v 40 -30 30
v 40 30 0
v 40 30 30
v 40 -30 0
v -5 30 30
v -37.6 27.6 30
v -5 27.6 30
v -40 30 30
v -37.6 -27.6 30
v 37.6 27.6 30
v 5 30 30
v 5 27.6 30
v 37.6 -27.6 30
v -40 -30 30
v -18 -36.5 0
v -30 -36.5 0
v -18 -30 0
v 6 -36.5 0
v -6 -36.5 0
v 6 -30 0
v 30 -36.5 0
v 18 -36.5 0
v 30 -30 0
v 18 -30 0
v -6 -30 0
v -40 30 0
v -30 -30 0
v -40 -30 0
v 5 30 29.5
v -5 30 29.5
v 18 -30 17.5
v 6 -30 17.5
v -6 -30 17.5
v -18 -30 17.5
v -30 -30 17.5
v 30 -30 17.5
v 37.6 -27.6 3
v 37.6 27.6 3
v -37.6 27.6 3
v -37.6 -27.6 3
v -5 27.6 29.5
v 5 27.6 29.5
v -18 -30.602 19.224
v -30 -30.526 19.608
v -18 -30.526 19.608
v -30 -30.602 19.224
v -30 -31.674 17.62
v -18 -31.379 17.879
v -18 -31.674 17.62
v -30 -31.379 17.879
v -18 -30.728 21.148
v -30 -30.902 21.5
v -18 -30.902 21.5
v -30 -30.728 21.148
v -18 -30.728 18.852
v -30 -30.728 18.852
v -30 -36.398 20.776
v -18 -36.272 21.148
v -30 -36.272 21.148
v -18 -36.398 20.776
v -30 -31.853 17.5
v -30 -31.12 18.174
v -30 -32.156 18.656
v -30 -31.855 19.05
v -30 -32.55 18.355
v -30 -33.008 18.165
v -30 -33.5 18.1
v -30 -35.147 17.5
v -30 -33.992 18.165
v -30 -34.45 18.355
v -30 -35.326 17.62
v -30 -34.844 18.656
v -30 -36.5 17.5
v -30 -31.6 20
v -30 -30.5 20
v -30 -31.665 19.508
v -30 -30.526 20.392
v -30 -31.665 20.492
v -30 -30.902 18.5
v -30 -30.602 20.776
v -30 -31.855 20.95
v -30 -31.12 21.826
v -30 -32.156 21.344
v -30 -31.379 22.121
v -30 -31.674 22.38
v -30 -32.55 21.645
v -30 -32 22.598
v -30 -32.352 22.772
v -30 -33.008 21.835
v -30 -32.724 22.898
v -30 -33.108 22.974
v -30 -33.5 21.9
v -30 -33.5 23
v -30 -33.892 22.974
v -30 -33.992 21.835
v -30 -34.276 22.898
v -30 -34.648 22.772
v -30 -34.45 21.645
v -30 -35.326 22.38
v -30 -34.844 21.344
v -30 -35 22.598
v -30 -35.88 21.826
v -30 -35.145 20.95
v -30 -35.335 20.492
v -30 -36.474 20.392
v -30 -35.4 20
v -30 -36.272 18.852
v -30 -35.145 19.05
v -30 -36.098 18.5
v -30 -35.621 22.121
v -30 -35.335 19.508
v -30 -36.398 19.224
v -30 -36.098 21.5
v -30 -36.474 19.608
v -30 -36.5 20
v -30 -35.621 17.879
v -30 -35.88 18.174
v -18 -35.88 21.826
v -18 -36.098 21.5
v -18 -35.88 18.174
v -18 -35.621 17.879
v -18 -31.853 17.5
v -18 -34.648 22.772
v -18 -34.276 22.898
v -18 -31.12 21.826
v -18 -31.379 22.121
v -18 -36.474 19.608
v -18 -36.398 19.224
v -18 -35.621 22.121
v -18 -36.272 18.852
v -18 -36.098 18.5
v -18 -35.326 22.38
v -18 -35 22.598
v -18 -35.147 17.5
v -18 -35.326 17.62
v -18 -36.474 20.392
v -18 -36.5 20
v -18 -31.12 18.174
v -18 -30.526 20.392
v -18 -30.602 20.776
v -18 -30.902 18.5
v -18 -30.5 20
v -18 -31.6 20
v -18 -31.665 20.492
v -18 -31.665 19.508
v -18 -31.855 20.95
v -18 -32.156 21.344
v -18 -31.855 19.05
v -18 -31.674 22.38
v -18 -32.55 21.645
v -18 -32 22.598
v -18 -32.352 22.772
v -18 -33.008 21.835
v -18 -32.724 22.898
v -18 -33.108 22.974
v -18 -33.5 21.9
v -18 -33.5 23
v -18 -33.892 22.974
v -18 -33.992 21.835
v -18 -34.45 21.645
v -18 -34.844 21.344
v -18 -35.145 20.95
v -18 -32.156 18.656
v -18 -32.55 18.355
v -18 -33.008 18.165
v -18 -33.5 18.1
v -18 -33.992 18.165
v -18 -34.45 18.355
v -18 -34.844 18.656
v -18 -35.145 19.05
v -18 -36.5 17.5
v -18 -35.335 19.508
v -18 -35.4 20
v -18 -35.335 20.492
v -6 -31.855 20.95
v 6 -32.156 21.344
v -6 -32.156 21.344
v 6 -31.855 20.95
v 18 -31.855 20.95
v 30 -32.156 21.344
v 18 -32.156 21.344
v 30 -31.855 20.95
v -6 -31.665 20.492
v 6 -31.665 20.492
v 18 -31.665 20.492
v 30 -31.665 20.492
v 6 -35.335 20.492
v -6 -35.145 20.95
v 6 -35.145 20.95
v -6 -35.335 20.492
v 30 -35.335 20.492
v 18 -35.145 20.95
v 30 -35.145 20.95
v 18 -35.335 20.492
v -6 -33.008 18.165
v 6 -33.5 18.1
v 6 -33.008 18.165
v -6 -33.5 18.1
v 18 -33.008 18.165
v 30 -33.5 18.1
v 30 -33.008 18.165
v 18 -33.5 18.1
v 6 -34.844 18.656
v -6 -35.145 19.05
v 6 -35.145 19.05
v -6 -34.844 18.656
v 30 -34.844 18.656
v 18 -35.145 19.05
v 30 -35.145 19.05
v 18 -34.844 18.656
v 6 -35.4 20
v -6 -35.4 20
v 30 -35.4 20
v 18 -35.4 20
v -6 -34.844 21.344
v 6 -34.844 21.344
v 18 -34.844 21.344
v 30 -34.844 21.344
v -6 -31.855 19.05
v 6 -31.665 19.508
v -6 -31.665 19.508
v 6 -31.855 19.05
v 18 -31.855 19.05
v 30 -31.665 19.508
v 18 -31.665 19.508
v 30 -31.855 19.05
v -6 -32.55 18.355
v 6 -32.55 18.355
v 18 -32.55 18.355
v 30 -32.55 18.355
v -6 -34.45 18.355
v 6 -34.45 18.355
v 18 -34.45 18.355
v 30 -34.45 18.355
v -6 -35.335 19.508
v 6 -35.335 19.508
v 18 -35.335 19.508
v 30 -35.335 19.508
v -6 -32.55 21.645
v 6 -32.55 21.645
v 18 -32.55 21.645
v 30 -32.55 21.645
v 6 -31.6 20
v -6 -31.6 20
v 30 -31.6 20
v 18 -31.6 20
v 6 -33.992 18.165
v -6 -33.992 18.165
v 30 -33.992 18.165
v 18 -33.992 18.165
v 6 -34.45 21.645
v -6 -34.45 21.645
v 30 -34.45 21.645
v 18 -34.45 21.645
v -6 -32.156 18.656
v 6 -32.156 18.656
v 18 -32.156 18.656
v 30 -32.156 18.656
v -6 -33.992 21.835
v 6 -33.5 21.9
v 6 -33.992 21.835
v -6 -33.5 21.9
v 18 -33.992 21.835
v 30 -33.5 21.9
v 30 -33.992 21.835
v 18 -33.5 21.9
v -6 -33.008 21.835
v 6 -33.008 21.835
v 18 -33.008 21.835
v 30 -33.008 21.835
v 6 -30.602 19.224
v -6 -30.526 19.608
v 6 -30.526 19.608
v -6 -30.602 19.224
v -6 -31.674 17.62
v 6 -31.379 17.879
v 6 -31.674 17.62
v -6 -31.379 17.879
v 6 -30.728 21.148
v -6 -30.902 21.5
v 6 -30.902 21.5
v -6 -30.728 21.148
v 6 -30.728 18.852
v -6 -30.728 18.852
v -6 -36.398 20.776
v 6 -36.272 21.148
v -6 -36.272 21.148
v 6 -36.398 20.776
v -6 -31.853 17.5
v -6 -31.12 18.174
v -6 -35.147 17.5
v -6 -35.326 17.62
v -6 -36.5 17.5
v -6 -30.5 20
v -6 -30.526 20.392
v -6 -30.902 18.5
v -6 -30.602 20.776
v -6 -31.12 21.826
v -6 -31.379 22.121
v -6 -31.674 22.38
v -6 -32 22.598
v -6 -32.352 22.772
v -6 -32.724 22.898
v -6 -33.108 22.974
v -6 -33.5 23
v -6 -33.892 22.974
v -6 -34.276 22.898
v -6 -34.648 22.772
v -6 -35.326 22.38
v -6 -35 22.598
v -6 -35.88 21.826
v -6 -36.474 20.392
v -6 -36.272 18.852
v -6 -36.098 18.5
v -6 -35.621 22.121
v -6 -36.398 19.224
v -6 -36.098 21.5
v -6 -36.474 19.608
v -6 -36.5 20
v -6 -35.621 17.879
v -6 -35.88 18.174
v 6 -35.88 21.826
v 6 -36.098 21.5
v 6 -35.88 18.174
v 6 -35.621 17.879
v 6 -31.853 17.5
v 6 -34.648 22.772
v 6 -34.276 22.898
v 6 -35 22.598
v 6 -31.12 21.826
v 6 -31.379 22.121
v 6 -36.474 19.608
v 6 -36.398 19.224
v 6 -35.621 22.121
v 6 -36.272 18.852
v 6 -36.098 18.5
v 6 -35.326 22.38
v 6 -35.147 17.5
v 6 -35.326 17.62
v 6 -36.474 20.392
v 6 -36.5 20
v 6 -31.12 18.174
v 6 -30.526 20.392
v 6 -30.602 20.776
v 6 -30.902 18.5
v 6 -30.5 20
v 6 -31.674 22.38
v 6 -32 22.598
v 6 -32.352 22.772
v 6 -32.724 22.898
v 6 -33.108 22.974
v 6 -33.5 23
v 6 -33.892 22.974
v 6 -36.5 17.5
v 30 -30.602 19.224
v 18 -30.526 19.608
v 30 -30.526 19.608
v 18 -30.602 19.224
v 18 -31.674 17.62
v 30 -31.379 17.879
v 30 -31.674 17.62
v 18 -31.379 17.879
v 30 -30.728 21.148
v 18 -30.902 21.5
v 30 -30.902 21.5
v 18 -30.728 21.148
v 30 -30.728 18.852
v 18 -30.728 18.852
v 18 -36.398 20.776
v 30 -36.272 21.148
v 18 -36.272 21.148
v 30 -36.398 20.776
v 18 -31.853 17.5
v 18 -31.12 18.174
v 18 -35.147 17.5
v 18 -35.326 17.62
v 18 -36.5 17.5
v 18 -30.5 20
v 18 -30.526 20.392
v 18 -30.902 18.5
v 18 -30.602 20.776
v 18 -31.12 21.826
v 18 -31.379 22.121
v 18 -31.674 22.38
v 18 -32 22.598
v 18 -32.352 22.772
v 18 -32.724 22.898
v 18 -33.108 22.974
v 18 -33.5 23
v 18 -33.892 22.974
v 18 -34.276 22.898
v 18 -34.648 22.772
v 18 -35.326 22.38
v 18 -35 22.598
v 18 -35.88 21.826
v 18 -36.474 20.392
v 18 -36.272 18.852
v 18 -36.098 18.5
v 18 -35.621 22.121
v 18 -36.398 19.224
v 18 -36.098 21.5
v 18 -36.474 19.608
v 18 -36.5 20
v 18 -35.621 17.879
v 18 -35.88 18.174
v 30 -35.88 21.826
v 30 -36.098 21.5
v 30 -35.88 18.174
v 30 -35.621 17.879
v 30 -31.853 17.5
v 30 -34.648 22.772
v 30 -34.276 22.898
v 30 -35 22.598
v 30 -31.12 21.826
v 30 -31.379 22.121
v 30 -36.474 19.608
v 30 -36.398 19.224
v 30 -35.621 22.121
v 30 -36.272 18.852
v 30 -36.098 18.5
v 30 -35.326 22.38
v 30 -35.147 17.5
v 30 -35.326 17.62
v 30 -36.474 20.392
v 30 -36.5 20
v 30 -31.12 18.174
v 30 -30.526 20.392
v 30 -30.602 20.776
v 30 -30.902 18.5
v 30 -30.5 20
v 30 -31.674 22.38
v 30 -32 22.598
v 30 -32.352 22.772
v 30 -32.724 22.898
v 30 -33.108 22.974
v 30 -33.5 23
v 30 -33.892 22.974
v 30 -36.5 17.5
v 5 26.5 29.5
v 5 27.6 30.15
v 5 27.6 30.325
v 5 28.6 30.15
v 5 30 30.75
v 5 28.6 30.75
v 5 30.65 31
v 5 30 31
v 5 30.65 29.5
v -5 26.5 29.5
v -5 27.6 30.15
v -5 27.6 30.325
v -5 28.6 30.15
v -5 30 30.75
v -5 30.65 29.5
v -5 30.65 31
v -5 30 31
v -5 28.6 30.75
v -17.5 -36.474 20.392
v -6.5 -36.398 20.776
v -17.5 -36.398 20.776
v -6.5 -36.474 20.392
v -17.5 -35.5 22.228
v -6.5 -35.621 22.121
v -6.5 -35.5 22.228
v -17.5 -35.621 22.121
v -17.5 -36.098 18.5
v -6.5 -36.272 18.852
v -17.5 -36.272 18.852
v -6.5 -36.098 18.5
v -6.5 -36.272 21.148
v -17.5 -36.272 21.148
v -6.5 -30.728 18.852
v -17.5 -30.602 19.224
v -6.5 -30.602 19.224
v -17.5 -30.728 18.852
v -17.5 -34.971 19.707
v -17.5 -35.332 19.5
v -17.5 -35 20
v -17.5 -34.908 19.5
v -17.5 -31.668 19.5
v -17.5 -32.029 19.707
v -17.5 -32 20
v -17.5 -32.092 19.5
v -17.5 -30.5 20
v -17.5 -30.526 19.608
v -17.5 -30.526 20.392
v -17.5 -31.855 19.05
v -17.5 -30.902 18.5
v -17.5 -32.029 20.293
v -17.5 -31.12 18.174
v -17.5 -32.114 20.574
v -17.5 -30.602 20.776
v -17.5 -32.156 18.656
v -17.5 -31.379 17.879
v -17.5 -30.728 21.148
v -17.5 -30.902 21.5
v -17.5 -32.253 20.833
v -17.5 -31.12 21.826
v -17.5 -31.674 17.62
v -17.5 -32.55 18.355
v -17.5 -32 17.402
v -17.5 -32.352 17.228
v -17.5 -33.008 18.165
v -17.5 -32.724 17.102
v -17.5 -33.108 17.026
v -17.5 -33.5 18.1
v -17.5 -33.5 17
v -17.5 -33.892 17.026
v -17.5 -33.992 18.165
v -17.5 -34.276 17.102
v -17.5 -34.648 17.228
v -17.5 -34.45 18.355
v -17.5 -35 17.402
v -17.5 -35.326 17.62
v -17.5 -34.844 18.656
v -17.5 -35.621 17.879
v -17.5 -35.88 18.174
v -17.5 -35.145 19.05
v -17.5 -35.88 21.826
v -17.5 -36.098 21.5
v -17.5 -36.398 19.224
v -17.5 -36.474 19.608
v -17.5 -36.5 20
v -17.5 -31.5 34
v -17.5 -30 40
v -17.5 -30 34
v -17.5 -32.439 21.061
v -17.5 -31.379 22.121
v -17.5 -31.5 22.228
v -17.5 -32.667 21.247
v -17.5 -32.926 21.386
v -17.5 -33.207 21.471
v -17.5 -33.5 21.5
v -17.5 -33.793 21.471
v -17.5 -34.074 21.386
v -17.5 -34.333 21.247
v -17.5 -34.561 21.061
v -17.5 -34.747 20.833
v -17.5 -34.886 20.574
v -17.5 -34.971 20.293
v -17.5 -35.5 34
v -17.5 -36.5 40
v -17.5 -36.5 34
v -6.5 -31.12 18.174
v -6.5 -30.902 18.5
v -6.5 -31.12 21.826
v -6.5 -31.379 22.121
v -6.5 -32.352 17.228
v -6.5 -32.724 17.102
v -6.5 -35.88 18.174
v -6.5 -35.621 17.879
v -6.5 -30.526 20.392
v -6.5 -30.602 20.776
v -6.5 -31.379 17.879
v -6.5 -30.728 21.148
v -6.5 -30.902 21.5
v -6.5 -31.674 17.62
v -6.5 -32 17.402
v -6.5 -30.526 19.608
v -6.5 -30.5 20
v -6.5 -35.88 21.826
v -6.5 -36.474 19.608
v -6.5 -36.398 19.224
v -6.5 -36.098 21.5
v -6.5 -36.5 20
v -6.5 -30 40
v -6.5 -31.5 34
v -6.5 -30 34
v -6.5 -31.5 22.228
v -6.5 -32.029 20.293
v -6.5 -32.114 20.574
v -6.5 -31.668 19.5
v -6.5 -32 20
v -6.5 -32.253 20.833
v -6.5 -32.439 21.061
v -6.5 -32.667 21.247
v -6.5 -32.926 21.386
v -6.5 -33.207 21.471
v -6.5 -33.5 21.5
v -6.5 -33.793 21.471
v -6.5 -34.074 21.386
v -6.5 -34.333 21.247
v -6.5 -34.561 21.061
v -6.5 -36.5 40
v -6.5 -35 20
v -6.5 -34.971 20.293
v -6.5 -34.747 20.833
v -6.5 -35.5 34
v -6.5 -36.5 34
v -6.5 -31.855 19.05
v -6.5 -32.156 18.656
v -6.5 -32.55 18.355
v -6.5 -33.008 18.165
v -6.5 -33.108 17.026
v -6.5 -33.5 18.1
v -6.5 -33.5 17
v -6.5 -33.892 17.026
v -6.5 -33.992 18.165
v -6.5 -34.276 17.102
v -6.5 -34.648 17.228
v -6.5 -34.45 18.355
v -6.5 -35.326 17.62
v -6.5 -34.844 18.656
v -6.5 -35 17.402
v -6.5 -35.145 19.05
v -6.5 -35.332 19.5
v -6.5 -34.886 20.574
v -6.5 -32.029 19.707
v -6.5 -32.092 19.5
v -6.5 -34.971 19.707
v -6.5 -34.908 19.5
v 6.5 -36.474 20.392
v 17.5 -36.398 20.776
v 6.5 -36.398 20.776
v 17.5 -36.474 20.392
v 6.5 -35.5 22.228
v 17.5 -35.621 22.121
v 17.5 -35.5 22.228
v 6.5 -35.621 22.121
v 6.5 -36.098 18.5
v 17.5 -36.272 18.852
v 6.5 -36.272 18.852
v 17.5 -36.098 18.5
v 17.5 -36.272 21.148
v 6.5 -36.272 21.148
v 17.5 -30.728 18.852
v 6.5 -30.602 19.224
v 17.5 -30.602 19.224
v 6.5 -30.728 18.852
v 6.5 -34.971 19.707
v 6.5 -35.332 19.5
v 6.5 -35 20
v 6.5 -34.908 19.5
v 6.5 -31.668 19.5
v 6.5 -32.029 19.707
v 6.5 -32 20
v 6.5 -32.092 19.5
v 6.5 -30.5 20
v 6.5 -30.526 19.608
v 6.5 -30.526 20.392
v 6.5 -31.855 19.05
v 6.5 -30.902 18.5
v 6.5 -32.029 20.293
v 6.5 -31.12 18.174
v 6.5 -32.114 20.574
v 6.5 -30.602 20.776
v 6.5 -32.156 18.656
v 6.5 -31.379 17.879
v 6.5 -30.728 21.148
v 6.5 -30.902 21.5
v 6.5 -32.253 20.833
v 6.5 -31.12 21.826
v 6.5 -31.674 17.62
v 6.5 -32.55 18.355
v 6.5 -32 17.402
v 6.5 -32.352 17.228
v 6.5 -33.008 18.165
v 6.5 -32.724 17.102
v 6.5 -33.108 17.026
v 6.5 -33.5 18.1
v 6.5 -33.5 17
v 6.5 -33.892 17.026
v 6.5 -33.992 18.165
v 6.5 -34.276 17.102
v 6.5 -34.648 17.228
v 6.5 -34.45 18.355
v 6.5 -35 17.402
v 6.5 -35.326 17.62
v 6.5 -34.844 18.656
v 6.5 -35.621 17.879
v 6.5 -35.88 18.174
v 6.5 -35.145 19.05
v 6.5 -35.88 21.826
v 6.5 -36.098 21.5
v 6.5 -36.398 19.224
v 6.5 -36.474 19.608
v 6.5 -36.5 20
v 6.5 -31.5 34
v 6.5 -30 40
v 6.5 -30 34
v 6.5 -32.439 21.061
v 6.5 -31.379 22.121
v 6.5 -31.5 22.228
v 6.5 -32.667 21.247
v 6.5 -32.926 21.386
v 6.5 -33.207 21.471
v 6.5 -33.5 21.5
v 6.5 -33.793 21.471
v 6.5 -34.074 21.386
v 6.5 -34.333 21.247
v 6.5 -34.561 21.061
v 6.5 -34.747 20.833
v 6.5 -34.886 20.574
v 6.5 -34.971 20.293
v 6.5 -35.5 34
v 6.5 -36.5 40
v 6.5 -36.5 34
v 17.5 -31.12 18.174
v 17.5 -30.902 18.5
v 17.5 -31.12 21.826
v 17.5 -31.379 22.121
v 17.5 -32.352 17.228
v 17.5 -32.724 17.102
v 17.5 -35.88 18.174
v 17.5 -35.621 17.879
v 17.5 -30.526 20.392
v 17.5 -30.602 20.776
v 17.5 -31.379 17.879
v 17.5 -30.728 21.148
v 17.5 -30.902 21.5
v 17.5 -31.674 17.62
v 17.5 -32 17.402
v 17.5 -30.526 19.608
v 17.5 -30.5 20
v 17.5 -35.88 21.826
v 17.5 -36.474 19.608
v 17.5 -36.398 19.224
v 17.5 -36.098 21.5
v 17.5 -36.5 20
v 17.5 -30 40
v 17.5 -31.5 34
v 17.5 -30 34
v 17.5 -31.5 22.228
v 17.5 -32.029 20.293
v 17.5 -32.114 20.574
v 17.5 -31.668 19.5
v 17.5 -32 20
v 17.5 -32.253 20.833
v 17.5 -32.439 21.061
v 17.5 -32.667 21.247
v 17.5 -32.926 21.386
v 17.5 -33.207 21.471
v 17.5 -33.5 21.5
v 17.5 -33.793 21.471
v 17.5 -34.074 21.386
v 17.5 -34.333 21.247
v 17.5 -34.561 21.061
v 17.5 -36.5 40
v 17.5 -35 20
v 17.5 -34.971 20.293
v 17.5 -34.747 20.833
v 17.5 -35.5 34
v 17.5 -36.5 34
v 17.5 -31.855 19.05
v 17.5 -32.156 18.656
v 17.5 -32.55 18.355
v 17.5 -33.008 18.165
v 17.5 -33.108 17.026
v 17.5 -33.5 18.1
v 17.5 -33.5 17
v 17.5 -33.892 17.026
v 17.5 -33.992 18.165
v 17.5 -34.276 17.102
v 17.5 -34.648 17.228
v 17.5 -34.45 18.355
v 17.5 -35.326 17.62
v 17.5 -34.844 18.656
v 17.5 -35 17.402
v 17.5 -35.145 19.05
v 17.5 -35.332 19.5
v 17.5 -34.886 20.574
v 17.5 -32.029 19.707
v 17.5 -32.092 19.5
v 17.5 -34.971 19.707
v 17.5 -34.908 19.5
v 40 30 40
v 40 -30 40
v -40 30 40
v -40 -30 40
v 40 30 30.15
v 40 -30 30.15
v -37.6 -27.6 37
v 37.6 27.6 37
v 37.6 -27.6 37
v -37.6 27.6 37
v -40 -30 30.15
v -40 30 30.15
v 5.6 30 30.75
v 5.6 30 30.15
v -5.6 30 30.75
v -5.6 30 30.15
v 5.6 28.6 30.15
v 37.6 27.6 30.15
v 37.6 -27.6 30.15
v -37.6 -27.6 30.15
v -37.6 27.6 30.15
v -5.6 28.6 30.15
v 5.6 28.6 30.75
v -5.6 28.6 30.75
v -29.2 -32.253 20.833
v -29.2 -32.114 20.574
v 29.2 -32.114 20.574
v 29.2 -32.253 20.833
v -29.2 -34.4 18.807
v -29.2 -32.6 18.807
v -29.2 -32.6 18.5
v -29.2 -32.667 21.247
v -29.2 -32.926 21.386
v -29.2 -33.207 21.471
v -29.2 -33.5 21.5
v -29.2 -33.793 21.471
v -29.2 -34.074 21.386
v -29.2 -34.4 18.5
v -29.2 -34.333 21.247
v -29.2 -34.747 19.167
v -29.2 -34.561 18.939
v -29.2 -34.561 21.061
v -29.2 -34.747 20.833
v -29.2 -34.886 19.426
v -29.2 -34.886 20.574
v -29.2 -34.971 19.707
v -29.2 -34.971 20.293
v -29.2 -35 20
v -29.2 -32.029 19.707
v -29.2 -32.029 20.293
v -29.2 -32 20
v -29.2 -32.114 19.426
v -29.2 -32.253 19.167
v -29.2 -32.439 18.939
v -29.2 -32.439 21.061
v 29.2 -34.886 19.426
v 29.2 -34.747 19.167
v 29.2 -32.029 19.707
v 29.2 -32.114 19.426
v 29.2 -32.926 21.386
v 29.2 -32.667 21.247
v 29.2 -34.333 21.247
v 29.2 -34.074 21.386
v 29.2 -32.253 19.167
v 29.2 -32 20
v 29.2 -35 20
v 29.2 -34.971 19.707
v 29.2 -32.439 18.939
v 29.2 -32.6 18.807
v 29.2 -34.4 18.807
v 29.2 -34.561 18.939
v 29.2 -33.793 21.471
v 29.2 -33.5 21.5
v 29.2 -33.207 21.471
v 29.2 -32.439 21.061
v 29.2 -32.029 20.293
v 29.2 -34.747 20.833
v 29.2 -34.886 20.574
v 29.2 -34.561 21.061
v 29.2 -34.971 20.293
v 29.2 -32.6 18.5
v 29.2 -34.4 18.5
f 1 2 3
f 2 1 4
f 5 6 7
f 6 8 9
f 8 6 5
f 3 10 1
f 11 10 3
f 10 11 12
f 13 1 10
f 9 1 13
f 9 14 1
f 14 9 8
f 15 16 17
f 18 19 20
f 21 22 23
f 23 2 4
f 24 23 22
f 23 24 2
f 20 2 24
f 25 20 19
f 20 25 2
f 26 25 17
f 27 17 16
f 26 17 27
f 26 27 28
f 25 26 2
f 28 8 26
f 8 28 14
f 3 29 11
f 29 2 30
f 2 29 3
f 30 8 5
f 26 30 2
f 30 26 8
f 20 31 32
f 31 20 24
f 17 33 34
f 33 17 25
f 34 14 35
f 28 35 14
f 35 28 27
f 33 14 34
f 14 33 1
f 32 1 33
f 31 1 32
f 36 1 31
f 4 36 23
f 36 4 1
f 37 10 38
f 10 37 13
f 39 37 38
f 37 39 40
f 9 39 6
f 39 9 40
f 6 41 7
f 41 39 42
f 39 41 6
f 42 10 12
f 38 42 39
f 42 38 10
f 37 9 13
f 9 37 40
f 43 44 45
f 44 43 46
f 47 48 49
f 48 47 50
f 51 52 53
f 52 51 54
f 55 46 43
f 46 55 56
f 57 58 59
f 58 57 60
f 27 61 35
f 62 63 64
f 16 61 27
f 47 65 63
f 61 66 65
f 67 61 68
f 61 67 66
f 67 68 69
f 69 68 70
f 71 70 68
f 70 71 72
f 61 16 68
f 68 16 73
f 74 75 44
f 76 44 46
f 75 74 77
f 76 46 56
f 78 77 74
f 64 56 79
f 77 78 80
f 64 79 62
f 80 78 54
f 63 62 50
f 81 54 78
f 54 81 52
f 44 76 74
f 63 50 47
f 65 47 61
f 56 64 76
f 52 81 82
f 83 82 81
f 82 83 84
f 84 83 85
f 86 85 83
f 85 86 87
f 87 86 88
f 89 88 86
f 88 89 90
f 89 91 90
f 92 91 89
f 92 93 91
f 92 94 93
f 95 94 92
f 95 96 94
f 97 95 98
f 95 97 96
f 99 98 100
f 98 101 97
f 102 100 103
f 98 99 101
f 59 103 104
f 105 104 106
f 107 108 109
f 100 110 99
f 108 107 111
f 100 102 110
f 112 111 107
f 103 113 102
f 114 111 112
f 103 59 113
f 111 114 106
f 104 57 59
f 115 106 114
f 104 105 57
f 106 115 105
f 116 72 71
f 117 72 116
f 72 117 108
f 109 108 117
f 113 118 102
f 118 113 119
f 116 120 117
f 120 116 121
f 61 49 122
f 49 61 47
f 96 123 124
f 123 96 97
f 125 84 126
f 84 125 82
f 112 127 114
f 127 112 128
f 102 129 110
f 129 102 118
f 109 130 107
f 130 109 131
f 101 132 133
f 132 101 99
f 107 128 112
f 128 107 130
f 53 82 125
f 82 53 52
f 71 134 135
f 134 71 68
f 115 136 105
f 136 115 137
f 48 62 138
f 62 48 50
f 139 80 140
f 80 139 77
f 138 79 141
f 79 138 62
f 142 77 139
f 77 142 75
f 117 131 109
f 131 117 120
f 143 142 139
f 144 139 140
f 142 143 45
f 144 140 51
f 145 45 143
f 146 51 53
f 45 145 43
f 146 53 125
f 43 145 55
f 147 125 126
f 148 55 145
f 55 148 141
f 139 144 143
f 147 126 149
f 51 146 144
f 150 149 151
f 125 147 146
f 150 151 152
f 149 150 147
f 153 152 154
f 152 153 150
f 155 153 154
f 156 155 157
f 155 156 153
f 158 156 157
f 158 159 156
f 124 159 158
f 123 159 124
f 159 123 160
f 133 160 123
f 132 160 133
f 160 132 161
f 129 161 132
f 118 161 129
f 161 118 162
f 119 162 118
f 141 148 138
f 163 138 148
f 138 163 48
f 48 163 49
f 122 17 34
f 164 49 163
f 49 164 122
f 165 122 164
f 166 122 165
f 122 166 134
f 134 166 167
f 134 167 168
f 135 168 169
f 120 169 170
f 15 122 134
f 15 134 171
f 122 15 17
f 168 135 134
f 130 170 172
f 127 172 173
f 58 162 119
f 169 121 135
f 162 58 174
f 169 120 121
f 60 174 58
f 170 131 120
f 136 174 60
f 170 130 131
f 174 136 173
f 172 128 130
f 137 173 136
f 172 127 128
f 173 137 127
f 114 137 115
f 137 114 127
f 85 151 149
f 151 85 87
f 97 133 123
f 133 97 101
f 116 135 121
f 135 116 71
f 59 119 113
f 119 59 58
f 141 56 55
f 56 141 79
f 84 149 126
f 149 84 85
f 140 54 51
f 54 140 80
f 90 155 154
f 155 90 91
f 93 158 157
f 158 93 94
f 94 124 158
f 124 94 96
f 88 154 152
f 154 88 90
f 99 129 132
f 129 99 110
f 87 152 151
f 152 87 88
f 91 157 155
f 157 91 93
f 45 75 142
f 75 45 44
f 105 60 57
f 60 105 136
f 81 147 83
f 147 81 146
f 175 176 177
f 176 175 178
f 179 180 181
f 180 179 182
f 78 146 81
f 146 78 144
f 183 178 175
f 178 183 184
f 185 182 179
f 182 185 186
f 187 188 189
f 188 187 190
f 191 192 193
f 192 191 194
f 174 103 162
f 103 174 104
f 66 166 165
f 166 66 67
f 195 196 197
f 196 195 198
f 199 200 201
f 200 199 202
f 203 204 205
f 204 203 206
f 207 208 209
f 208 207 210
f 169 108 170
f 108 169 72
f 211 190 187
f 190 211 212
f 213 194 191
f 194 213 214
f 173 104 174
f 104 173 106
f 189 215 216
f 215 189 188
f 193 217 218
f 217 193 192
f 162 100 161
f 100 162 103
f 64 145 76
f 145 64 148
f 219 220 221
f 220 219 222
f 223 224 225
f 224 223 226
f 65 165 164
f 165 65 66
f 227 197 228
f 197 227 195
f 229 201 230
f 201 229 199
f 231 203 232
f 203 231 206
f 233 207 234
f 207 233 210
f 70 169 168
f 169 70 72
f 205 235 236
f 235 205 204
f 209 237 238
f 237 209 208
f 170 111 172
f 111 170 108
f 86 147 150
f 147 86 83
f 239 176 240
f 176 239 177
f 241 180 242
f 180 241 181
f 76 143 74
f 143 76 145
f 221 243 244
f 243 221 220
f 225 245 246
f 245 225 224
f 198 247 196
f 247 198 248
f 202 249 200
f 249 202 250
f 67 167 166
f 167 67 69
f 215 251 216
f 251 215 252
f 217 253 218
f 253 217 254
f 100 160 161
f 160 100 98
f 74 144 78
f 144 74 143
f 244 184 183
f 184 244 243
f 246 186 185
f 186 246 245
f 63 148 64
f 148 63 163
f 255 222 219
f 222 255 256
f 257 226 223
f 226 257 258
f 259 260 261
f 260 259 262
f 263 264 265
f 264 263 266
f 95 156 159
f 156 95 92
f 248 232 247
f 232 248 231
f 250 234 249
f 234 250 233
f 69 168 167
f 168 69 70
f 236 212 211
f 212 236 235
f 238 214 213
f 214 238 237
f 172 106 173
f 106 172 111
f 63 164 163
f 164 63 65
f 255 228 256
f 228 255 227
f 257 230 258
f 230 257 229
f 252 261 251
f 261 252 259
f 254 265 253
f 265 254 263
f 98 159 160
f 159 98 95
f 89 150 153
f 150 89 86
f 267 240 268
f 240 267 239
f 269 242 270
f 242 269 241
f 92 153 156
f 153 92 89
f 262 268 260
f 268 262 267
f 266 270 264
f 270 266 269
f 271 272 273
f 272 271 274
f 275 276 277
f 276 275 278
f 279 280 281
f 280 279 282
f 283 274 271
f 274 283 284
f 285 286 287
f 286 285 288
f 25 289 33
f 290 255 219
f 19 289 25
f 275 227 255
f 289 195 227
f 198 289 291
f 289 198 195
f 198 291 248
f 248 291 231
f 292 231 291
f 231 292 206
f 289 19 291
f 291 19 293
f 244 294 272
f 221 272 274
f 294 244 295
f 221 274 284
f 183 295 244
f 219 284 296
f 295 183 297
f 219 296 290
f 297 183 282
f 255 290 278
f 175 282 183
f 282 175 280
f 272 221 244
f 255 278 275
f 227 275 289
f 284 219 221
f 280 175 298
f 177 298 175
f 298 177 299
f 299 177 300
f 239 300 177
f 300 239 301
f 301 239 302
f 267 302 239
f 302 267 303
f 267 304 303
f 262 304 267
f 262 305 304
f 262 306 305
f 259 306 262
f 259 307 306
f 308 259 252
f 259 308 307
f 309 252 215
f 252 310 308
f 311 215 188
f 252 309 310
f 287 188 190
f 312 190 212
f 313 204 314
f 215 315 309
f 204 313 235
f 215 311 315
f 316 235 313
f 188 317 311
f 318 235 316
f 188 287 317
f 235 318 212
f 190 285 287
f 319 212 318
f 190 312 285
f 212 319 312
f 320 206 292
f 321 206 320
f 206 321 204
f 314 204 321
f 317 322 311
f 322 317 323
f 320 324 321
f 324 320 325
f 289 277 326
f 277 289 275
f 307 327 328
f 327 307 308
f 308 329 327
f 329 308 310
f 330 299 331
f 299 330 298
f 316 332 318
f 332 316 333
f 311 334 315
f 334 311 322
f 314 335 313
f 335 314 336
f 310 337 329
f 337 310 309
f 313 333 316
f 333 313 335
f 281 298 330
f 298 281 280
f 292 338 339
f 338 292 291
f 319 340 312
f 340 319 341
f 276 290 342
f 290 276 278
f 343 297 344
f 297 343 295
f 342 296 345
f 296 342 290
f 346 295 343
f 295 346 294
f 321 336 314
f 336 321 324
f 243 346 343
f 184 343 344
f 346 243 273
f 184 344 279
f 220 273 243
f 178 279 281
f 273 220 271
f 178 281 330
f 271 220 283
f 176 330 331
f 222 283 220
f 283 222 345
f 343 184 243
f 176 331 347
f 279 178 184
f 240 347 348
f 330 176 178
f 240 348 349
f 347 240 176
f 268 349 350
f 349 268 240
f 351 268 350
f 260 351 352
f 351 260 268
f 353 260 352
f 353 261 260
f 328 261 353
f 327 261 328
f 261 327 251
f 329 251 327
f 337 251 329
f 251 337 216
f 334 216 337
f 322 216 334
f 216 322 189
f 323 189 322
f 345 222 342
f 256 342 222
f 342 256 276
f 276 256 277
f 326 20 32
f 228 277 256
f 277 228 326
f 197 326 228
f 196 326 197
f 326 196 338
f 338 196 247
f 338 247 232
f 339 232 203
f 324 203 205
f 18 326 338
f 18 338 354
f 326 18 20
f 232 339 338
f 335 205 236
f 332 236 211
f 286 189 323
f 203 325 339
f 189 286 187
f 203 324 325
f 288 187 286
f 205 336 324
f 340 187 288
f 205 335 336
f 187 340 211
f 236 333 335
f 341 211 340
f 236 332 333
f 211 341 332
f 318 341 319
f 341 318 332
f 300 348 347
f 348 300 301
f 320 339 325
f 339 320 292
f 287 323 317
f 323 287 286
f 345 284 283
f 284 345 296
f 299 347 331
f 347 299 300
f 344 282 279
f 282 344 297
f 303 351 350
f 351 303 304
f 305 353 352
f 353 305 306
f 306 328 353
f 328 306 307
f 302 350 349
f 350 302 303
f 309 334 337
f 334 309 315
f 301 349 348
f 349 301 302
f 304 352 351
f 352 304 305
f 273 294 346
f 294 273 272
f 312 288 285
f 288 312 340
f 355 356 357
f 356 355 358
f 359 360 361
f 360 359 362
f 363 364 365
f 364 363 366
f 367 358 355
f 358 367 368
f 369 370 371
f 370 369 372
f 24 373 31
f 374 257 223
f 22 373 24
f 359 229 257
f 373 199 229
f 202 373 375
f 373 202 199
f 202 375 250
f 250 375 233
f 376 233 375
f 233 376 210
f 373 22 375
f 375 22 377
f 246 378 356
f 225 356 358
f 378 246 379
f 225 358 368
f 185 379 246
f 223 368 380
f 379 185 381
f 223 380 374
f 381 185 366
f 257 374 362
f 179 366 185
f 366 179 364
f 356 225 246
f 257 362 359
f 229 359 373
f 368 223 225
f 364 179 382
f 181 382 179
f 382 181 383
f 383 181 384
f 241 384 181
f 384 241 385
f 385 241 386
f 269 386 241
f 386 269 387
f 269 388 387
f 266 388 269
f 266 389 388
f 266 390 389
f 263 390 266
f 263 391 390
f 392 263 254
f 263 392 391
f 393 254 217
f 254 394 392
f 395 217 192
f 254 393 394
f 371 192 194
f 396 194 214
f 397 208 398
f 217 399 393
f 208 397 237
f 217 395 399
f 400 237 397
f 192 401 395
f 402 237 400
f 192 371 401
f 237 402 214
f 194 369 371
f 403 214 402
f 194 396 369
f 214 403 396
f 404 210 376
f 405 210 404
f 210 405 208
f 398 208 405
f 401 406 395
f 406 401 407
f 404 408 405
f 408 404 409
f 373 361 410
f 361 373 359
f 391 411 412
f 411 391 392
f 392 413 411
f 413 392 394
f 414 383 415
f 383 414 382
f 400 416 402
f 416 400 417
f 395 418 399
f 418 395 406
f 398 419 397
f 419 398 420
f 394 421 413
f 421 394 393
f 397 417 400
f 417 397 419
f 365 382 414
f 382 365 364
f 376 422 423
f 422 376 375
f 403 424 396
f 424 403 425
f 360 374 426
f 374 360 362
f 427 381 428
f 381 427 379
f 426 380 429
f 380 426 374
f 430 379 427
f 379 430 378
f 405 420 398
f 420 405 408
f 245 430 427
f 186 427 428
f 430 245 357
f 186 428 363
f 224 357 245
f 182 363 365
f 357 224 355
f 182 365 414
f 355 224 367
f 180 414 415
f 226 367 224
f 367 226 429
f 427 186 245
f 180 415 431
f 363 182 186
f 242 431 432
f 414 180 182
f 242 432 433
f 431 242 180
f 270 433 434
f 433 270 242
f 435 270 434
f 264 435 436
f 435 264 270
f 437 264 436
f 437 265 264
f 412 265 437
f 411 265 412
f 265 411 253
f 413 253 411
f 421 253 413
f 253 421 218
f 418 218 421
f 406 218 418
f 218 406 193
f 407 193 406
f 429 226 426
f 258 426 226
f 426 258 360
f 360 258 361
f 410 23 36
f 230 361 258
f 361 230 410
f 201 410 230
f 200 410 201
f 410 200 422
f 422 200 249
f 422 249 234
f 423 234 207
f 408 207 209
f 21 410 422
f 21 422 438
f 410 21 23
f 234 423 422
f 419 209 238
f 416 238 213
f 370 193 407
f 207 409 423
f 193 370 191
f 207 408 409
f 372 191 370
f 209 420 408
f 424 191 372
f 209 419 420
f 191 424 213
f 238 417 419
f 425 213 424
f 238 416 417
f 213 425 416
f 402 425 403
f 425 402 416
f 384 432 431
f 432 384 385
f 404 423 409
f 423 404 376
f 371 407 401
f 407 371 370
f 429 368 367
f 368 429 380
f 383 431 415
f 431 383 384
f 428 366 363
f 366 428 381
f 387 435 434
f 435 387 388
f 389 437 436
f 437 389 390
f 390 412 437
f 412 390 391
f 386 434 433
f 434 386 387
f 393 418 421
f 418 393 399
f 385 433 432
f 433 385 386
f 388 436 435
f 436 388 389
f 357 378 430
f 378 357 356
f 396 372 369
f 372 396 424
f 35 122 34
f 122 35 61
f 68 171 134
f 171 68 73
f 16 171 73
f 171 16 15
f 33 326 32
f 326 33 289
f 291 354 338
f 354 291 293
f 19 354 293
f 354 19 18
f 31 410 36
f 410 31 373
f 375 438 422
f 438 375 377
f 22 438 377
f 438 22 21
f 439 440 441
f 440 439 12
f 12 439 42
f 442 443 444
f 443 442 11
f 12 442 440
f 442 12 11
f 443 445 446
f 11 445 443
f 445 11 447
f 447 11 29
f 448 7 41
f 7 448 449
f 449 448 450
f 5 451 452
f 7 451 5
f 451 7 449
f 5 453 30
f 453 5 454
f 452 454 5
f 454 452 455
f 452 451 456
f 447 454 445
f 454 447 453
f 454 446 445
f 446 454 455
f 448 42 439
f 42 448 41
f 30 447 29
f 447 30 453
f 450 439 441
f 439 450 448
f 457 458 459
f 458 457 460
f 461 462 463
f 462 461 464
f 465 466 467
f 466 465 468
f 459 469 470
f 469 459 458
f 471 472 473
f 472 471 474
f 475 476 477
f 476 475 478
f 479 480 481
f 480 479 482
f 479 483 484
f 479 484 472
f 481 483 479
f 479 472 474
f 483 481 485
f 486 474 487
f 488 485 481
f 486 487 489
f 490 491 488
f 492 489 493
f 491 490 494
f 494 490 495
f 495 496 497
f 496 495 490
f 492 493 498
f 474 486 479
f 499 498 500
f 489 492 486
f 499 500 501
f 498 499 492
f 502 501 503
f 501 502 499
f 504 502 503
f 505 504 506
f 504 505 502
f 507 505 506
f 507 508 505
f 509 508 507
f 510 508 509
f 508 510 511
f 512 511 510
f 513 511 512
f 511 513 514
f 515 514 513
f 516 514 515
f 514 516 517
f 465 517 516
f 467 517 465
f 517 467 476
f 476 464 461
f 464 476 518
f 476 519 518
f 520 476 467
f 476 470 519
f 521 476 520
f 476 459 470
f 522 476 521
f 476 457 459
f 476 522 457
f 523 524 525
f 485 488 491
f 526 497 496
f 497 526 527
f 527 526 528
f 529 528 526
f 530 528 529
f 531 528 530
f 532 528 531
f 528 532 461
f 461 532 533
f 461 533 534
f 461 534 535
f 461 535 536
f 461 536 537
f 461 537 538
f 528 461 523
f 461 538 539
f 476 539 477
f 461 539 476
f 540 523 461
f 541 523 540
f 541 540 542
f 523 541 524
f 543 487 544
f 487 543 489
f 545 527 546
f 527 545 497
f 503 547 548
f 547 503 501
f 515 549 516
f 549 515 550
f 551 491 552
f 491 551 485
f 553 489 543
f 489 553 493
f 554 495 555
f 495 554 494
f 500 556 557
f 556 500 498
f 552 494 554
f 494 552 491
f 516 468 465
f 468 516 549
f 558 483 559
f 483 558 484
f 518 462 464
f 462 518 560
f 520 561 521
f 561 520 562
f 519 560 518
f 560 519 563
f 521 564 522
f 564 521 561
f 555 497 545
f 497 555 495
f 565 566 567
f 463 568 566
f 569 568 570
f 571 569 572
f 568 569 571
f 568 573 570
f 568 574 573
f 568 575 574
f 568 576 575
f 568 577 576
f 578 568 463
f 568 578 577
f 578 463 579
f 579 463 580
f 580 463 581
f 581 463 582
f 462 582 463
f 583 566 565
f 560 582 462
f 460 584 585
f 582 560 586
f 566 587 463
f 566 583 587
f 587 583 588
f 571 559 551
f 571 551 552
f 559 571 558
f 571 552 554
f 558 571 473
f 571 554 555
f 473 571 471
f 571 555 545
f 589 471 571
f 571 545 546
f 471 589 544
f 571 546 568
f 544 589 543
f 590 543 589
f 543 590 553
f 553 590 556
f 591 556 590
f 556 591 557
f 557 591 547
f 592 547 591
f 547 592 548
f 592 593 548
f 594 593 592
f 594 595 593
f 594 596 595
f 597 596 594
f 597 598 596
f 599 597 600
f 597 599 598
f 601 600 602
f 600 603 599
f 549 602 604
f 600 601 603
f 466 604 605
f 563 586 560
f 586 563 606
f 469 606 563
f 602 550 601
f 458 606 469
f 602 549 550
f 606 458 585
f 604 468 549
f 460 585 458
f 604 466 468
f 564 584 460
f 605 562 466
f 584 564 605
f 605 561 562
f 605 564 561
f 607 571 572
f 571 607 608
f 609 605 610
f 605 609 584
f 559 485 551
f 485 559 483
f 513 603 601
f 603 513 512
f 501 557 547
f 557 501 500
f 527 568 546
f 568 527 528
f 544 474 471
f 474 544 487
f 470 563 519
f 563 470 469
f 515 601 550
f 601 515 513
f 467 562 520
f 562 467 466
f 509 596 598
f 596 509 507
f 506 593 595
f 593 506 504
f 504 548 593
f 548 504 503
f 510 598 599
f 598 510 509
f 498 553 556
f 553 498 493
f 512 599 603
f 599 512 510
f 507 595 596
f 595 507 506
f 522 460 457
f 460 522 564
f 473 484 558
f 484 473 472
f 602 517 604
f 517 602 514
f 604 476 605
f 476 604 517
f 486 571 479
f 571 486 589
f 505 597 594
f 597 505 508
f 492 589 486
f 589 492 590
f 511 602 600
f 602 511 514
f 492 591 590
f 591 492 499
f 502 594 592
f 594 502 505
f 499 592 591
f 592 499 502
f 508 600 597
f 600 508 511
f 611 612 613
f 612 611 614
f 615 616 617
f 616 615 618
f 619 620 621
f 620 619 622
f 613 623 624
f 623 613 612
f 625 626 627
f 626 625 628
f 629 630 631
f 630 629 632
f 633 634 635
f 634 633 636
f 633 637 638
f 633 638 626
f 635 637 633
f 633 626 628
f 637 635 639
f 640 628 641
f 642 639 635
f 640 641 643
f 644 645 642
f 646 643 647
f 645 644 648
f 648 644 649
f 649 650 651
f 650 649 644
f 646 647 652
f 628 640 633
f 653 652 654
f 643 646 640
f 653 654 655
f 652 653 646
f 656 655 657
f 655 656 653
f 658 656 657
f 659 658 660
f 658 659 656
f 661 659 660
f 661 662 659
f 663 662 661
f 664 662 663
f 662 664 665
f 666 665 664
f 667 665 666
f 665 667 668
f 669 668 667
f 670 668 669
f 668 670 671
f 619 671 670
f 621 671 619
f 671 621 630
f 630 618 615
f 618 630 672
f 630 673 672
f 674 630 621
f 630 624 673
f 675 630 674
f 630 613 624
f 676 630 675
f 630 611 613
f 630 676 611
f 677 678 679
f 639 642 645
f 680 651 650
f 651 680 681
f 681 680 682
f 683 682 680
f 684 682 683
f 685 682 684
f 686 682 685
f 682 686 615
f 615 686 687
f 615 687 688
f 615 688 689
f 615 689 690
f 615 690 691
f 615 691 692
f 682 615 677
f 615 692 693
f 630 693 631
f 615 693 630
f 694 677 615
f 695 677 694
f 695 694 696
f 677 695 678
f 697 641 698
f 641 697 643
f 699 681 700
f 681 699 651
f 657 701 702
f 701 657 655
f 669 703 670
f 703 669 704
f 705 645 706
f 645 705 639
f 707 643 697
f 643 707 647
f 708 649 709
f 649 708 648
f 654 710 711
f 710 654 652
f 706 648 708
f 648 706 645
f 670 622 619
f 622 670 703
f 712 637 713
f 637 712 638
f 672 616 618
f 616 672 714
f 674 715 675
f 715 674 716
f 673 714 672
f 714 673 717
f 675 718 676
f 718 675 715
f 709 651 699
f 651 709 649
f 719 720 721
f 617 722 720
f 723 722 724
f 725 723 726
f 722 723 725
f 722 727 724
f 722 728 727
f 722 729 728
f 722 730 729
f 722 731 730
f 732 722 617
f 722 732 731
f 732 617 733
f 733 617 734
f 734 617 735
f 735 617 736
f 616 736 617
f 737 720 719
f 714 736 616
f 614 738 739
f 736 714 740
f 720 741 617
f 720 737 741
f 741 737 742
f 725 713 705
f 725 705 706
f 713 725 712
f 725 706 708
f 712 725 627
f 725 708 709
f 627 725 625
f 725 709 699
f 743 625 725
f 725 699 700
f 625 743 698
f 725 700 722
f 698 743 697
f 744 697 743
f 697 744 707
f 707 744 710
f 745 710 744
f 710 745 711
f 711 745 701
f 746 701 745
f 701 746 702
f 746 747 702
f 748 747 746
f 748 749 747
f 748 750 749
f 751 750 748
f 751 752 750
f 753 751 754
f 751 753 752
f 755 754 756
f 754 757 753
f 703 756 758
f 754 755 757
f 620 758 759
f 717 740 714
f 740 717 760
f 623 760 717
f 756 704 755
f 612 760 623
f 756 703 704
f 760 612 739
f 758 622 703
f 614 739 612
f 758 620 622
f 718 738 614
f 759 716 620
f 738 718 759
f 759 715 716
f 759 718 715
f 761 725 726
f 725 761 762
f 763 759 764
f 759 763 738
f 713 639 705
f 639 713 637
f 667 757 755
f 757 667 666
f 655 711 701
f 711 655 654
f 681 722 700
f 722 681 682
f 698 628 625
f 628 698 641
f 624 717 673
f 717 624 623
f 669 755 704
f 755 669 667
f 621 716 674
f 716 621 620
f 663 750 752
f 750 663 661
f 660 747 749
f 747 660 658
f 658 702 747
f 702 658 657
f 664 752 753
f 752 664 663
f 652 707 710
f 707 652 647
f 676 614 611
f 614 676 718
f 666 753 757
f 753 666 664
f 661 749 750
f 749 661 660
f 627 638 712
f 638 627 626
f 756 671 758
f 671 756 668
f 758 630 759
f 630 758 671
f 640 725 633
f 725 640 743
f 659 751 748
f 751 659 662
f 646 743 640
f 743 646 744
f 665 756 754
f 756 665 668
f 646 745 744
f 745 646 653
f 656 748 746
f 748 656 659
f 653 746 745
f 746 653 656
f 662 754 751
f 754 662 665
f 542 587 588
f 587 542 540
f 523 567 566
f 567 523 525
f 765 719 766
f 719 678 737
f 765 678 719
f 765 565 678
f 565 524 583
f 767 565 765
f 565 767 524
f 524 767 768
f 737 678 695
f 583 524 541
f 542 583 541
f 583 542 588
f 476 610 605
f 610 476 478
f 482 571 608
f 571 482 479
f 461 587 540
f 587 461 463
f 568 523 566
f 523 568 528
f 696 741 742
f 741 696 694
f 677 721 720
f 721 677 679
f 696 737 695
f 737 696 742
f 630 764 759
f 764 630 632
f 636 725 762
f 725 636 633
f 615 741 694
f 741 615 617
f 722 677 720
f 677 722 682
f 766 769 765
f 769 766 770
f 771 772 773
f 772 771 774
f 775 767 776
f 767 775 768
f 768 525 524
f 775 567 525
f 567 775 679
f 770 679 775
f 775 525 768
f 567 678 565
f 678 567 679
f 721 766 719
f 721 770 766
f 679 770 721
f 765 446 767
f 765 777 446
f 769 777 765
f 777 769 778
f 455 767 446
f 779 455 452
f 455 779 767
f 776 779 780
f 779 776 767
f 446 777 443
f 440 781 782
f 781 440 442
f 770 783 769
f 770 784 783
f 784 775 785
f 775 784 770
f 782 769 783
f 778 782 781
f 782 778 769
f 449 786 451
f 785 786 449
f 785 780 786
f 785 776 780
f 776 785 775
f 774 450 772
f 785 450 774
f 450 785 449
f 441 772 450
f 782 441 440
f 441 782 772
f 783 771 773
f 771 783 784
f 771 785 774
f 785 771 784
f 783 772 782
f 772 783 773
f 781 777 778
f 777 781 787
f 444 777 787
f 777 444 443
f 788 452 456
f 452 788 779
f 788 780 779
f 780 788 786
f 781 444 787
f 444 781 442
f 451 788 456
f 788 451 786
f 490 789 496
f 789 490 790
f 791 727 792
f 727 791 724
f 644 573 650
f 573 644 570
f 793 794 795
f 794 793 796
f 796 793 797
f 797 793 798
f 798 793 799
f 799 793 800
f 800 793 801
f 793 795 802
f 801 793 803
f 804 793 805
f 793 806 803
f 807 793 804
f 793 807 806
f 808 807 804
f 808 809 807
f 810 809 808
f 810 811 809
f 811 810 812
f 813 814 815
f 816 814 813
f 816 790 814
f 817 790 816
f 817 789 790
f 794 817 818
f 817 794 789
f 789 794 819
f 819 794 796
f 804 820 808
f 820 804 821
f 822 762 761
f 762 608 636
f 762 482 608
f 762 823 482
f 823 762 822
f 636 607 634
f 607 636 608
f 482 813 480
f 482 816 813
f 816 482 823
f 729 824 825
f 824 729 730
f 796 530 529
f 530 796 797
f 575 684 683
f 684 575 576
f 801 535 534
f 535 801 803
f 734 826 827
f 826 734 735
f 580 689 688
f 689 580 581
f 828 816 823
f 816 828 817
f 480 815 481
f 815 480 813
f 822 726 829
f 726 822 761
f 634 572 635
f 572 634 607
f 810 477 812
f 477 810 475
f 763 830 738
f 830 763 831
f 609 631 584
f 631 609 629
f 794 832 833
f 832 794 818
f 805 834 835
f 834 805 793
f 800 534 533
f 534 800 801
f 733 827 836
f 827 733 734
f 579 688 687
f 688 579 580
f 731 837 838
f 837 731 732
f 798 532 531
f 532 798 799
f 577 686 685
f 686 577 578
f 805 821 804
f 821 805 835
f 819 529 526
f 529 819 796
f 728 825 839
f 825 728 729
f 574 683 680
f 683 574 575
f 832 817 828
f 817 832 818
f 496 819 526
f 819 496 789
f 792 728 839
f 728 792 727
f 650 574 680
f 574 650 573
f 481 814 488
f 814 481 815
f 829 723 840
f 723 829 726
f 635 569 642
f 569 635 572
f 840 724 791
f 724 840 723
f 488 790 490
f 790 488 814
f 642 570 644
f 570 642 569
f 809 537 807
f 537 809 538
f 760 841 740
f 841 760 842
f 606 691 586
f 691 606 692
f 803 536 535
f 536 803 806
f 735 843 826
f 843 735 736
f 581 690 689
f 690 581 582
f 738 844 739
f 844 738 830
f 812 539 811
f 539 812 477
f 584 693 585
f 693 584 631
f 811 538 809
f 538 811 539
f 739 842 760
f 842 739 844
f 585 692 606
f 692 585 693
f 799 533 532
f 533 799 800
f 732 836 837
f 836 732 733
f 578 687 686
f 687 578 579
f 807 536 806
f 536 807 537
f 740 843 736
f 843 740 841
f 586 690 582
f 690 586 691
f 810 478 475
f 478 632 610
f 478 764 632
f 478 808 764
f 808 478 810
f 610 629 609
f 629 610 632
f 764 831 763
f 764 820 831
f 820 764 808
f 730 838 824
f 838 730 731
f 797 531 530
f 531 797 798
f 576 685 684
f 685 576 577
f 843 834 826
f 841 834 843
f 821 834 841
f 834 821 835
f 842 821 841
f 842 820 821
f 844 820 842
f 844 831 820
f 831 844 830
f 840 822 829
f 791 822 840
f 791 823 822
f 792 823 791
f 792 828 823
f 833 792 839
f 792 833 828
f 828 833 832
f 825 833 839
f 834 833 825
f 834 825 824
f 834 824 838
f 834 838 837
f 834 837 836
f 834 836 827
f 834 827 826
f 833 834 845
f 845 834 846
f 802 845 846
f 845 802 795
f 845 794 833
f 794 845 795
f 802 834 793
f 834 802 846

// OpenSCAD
part = "assembly"; // [base, lid, pin, assembly]
cadverify_only = "";
module instance(name, part, unit = 1) {
  echo(cadverify_instance = [name, part, unit]);
  if (cadverify_only == "" || cadverify_only == name) children();
}
Ya = -33.5; Za = 20; Kr = 3.0; Br = 1.9; Pr = 1.5;
BX = [[-30,-18],[-6,6],[18,30]];
LX = [[-17.5,-6.5],[6.5,17.5]];
module barrelX(x0, x1) {
  difference() {
    translate([0,Ya,Za]) rotate([0,90,0]) translate([0,0,(x0+x1)/2])
      cylinder(h=x1-x0, r=Kr, center=true, $fn=48);
    translate([0,Ya,Za]) rotate([0,90,0]) translate([0,0,(x0+x1)/2])
      cylinder(h=(x1-x0)+1.0, r=Br, center=true, $fn=24);
  }
}
module base_geom() {
  difference() {
  union() {
    difference() {
      translate([-40,-30,0]) cube([80,60,30]);
      translate([-37.6,-27.6,3]) cube([75.2,55.2,27.01]);
    }
    for (b=BX) {
      translate([b[0],-36.5,0]) cube([b[1]-b[0],6.5,17.5]);
      barrelX(b[0], b[1]);
    }
    translate([5,0,0]) rotate([0,-90,0]) linear_extrude(height=10)
      polygon([[29.5,26.5],[31,28.5],[31,30.65],[29.5,30.65]]);
  }
  translate([0,Ya,Za]) rotate([0,90,0]) translate([0,0,0])
    cylinder(h=62, r=Br, center=true, $fn=24);
  }
}
module lid_open() {
  difference() {
    union() {
      translate([-40,-97,0]) cube([80,60,3]);
      translate([-40,-97,3]) cube([80,2.4,6.85]);
      translate([-40,-39.4,3]) cube([80,2.4,6.85]);
      translate([-40,-97,3]) cube([2.4,60,6.85]);
      translate([37.6,-97,3]) cube([2.4,60,6.85]);
      for (b=LX) {
        translate([b[0],-39,0]) cube([b[1]-b[0],8.5,6]);
        translate([b[0],-35.5,3]) cube([b[1]-b[0],4,17.5]);
        barrelX(b[0], b[1]);
      }
    }
    translate([-5.6,-98.6,9.25]) cube([11.2,3,0.76]);
  }
}
module pin_geom() {
  union() {
    translate([-29.2,0,1.5]) rotate([0,90,0])
      cylinder(h=58.4, r=Pr, center=false, $fn=32);
    translate([-29.2,-0.9,0]) cube([58.4,1.8,0.6]);
  }
}
module lid_closed() {
  translate([0,Ya,Za]) rotate([180,0,0]) translate([0,-Ya,-Za]) lid_open();
}
module pin_placed() {
  translate([0,Ya,Za-1.5]) pin_geom();
}
if (part=="base") {
  base_geom();
  echo(cadverify_spec=[
    ["bounds", [[-40,-36.5,0],[40,31,30.65]]],
    ["bodies", 1],
    ["support_faces", [["base","-z",4000]]],
    ["overhangs_allowed", [["hinge", [[-30,-37,16],[30,-30,24]]]]],
    ["copies", 1],
    ["details", [
      ["bottom","thickness",[0,0,-1],[0,0,1],3],
      ["cavity","void",[[-37.6,-27.6,3],[37.6,27.6,30]],0.9],
      ["knuckle","material",[[-30,-36.5,17],[-18,-30.5,23]],0.5],
      ["bore","hole",[-31,-33.5,20],[1,0,0],[[0,3.8],[10,3.8]]],
      ["catch","material",[[-5,30,26.5],[5,31,30.65]],0.6]
    ]]
  ]);
} else if (part=="lid") {
  lid_open();
  echo(cadverify_spec=[
    ["bounds", [[-40,-97,0],[40,-30.5,23.5]]],
    ["bodies", 1],
    ["support_faces", [["lid","-z",4000]]],
    ["overhangs_allowed", [["hinge", [[-30,-37,16],[30,-30,24]]]]],
    ["copies", 1],
    ["details", [
      ["plate","thickness",[0,-67,-1],[0,0,1],3],
      ["pocket","void",[[-37.6,-94.6,3],[37.6,-39.4,9.85]],0.9],
      ["knuckle","material",[[-17.5,-36.5,17],[-6.5,-30.5,23]],0.8],
      ["bore","hole",[-18,-33.5,20],[1,0,0],[[0,3.8],[9,3.8]]],
      ["notch","void",[[-5.6,-97,9.25],[5.6,-95.6,9.85]],0.9]
    ]]
  ]);
} else if (part=="pin") {
  pin_geom();
  echo(cadverify_spec=[
    ["bounds", [[-29.2,-1.5,0],[29.2,1.5,3]]],
    ["bodies", 1],
    ["support_faces", [["pin","-z",50]]],
    ["overhangs_allowed", [["flanks", [[-29.2,-1.5,0],[29.2,1.5,3]]]]],
    ["copies", 1],
    ["details", [
      ["shaft","thickness",[0,5,1.5],[0,-1,0],3]
    ]]
  ]);
} else {
  instance("base","base") base_geom();
  instance("lid","lid") lid_closed();
  instance("pin","pin") pin_placed();
  echo(cadverify_spec=[
    ["bounds", [[-40,-36.5,0],[40,31,40]]],
    ["support_faces", [["bed","-z",4000]]],
    ["motions", [["swing",["lid"],"rotate",[0,-33.5,20],[1,0,0],[0,180],["flex",[["lid","base",0.5,"catch entry"]]]]]],
    ["assembly_order", [[["base"],[0,0,0]],[["lid"],[0,0,1]],[["pin"],[-1,0,0]]]],
    ["print_in_place", 0.4],
    ["print_pose", [["swing",180]]],
    ["overhangs_allowed", [["hinge", [[-30,-37,16],[30,-30,24]]]]]
  ]);
}
